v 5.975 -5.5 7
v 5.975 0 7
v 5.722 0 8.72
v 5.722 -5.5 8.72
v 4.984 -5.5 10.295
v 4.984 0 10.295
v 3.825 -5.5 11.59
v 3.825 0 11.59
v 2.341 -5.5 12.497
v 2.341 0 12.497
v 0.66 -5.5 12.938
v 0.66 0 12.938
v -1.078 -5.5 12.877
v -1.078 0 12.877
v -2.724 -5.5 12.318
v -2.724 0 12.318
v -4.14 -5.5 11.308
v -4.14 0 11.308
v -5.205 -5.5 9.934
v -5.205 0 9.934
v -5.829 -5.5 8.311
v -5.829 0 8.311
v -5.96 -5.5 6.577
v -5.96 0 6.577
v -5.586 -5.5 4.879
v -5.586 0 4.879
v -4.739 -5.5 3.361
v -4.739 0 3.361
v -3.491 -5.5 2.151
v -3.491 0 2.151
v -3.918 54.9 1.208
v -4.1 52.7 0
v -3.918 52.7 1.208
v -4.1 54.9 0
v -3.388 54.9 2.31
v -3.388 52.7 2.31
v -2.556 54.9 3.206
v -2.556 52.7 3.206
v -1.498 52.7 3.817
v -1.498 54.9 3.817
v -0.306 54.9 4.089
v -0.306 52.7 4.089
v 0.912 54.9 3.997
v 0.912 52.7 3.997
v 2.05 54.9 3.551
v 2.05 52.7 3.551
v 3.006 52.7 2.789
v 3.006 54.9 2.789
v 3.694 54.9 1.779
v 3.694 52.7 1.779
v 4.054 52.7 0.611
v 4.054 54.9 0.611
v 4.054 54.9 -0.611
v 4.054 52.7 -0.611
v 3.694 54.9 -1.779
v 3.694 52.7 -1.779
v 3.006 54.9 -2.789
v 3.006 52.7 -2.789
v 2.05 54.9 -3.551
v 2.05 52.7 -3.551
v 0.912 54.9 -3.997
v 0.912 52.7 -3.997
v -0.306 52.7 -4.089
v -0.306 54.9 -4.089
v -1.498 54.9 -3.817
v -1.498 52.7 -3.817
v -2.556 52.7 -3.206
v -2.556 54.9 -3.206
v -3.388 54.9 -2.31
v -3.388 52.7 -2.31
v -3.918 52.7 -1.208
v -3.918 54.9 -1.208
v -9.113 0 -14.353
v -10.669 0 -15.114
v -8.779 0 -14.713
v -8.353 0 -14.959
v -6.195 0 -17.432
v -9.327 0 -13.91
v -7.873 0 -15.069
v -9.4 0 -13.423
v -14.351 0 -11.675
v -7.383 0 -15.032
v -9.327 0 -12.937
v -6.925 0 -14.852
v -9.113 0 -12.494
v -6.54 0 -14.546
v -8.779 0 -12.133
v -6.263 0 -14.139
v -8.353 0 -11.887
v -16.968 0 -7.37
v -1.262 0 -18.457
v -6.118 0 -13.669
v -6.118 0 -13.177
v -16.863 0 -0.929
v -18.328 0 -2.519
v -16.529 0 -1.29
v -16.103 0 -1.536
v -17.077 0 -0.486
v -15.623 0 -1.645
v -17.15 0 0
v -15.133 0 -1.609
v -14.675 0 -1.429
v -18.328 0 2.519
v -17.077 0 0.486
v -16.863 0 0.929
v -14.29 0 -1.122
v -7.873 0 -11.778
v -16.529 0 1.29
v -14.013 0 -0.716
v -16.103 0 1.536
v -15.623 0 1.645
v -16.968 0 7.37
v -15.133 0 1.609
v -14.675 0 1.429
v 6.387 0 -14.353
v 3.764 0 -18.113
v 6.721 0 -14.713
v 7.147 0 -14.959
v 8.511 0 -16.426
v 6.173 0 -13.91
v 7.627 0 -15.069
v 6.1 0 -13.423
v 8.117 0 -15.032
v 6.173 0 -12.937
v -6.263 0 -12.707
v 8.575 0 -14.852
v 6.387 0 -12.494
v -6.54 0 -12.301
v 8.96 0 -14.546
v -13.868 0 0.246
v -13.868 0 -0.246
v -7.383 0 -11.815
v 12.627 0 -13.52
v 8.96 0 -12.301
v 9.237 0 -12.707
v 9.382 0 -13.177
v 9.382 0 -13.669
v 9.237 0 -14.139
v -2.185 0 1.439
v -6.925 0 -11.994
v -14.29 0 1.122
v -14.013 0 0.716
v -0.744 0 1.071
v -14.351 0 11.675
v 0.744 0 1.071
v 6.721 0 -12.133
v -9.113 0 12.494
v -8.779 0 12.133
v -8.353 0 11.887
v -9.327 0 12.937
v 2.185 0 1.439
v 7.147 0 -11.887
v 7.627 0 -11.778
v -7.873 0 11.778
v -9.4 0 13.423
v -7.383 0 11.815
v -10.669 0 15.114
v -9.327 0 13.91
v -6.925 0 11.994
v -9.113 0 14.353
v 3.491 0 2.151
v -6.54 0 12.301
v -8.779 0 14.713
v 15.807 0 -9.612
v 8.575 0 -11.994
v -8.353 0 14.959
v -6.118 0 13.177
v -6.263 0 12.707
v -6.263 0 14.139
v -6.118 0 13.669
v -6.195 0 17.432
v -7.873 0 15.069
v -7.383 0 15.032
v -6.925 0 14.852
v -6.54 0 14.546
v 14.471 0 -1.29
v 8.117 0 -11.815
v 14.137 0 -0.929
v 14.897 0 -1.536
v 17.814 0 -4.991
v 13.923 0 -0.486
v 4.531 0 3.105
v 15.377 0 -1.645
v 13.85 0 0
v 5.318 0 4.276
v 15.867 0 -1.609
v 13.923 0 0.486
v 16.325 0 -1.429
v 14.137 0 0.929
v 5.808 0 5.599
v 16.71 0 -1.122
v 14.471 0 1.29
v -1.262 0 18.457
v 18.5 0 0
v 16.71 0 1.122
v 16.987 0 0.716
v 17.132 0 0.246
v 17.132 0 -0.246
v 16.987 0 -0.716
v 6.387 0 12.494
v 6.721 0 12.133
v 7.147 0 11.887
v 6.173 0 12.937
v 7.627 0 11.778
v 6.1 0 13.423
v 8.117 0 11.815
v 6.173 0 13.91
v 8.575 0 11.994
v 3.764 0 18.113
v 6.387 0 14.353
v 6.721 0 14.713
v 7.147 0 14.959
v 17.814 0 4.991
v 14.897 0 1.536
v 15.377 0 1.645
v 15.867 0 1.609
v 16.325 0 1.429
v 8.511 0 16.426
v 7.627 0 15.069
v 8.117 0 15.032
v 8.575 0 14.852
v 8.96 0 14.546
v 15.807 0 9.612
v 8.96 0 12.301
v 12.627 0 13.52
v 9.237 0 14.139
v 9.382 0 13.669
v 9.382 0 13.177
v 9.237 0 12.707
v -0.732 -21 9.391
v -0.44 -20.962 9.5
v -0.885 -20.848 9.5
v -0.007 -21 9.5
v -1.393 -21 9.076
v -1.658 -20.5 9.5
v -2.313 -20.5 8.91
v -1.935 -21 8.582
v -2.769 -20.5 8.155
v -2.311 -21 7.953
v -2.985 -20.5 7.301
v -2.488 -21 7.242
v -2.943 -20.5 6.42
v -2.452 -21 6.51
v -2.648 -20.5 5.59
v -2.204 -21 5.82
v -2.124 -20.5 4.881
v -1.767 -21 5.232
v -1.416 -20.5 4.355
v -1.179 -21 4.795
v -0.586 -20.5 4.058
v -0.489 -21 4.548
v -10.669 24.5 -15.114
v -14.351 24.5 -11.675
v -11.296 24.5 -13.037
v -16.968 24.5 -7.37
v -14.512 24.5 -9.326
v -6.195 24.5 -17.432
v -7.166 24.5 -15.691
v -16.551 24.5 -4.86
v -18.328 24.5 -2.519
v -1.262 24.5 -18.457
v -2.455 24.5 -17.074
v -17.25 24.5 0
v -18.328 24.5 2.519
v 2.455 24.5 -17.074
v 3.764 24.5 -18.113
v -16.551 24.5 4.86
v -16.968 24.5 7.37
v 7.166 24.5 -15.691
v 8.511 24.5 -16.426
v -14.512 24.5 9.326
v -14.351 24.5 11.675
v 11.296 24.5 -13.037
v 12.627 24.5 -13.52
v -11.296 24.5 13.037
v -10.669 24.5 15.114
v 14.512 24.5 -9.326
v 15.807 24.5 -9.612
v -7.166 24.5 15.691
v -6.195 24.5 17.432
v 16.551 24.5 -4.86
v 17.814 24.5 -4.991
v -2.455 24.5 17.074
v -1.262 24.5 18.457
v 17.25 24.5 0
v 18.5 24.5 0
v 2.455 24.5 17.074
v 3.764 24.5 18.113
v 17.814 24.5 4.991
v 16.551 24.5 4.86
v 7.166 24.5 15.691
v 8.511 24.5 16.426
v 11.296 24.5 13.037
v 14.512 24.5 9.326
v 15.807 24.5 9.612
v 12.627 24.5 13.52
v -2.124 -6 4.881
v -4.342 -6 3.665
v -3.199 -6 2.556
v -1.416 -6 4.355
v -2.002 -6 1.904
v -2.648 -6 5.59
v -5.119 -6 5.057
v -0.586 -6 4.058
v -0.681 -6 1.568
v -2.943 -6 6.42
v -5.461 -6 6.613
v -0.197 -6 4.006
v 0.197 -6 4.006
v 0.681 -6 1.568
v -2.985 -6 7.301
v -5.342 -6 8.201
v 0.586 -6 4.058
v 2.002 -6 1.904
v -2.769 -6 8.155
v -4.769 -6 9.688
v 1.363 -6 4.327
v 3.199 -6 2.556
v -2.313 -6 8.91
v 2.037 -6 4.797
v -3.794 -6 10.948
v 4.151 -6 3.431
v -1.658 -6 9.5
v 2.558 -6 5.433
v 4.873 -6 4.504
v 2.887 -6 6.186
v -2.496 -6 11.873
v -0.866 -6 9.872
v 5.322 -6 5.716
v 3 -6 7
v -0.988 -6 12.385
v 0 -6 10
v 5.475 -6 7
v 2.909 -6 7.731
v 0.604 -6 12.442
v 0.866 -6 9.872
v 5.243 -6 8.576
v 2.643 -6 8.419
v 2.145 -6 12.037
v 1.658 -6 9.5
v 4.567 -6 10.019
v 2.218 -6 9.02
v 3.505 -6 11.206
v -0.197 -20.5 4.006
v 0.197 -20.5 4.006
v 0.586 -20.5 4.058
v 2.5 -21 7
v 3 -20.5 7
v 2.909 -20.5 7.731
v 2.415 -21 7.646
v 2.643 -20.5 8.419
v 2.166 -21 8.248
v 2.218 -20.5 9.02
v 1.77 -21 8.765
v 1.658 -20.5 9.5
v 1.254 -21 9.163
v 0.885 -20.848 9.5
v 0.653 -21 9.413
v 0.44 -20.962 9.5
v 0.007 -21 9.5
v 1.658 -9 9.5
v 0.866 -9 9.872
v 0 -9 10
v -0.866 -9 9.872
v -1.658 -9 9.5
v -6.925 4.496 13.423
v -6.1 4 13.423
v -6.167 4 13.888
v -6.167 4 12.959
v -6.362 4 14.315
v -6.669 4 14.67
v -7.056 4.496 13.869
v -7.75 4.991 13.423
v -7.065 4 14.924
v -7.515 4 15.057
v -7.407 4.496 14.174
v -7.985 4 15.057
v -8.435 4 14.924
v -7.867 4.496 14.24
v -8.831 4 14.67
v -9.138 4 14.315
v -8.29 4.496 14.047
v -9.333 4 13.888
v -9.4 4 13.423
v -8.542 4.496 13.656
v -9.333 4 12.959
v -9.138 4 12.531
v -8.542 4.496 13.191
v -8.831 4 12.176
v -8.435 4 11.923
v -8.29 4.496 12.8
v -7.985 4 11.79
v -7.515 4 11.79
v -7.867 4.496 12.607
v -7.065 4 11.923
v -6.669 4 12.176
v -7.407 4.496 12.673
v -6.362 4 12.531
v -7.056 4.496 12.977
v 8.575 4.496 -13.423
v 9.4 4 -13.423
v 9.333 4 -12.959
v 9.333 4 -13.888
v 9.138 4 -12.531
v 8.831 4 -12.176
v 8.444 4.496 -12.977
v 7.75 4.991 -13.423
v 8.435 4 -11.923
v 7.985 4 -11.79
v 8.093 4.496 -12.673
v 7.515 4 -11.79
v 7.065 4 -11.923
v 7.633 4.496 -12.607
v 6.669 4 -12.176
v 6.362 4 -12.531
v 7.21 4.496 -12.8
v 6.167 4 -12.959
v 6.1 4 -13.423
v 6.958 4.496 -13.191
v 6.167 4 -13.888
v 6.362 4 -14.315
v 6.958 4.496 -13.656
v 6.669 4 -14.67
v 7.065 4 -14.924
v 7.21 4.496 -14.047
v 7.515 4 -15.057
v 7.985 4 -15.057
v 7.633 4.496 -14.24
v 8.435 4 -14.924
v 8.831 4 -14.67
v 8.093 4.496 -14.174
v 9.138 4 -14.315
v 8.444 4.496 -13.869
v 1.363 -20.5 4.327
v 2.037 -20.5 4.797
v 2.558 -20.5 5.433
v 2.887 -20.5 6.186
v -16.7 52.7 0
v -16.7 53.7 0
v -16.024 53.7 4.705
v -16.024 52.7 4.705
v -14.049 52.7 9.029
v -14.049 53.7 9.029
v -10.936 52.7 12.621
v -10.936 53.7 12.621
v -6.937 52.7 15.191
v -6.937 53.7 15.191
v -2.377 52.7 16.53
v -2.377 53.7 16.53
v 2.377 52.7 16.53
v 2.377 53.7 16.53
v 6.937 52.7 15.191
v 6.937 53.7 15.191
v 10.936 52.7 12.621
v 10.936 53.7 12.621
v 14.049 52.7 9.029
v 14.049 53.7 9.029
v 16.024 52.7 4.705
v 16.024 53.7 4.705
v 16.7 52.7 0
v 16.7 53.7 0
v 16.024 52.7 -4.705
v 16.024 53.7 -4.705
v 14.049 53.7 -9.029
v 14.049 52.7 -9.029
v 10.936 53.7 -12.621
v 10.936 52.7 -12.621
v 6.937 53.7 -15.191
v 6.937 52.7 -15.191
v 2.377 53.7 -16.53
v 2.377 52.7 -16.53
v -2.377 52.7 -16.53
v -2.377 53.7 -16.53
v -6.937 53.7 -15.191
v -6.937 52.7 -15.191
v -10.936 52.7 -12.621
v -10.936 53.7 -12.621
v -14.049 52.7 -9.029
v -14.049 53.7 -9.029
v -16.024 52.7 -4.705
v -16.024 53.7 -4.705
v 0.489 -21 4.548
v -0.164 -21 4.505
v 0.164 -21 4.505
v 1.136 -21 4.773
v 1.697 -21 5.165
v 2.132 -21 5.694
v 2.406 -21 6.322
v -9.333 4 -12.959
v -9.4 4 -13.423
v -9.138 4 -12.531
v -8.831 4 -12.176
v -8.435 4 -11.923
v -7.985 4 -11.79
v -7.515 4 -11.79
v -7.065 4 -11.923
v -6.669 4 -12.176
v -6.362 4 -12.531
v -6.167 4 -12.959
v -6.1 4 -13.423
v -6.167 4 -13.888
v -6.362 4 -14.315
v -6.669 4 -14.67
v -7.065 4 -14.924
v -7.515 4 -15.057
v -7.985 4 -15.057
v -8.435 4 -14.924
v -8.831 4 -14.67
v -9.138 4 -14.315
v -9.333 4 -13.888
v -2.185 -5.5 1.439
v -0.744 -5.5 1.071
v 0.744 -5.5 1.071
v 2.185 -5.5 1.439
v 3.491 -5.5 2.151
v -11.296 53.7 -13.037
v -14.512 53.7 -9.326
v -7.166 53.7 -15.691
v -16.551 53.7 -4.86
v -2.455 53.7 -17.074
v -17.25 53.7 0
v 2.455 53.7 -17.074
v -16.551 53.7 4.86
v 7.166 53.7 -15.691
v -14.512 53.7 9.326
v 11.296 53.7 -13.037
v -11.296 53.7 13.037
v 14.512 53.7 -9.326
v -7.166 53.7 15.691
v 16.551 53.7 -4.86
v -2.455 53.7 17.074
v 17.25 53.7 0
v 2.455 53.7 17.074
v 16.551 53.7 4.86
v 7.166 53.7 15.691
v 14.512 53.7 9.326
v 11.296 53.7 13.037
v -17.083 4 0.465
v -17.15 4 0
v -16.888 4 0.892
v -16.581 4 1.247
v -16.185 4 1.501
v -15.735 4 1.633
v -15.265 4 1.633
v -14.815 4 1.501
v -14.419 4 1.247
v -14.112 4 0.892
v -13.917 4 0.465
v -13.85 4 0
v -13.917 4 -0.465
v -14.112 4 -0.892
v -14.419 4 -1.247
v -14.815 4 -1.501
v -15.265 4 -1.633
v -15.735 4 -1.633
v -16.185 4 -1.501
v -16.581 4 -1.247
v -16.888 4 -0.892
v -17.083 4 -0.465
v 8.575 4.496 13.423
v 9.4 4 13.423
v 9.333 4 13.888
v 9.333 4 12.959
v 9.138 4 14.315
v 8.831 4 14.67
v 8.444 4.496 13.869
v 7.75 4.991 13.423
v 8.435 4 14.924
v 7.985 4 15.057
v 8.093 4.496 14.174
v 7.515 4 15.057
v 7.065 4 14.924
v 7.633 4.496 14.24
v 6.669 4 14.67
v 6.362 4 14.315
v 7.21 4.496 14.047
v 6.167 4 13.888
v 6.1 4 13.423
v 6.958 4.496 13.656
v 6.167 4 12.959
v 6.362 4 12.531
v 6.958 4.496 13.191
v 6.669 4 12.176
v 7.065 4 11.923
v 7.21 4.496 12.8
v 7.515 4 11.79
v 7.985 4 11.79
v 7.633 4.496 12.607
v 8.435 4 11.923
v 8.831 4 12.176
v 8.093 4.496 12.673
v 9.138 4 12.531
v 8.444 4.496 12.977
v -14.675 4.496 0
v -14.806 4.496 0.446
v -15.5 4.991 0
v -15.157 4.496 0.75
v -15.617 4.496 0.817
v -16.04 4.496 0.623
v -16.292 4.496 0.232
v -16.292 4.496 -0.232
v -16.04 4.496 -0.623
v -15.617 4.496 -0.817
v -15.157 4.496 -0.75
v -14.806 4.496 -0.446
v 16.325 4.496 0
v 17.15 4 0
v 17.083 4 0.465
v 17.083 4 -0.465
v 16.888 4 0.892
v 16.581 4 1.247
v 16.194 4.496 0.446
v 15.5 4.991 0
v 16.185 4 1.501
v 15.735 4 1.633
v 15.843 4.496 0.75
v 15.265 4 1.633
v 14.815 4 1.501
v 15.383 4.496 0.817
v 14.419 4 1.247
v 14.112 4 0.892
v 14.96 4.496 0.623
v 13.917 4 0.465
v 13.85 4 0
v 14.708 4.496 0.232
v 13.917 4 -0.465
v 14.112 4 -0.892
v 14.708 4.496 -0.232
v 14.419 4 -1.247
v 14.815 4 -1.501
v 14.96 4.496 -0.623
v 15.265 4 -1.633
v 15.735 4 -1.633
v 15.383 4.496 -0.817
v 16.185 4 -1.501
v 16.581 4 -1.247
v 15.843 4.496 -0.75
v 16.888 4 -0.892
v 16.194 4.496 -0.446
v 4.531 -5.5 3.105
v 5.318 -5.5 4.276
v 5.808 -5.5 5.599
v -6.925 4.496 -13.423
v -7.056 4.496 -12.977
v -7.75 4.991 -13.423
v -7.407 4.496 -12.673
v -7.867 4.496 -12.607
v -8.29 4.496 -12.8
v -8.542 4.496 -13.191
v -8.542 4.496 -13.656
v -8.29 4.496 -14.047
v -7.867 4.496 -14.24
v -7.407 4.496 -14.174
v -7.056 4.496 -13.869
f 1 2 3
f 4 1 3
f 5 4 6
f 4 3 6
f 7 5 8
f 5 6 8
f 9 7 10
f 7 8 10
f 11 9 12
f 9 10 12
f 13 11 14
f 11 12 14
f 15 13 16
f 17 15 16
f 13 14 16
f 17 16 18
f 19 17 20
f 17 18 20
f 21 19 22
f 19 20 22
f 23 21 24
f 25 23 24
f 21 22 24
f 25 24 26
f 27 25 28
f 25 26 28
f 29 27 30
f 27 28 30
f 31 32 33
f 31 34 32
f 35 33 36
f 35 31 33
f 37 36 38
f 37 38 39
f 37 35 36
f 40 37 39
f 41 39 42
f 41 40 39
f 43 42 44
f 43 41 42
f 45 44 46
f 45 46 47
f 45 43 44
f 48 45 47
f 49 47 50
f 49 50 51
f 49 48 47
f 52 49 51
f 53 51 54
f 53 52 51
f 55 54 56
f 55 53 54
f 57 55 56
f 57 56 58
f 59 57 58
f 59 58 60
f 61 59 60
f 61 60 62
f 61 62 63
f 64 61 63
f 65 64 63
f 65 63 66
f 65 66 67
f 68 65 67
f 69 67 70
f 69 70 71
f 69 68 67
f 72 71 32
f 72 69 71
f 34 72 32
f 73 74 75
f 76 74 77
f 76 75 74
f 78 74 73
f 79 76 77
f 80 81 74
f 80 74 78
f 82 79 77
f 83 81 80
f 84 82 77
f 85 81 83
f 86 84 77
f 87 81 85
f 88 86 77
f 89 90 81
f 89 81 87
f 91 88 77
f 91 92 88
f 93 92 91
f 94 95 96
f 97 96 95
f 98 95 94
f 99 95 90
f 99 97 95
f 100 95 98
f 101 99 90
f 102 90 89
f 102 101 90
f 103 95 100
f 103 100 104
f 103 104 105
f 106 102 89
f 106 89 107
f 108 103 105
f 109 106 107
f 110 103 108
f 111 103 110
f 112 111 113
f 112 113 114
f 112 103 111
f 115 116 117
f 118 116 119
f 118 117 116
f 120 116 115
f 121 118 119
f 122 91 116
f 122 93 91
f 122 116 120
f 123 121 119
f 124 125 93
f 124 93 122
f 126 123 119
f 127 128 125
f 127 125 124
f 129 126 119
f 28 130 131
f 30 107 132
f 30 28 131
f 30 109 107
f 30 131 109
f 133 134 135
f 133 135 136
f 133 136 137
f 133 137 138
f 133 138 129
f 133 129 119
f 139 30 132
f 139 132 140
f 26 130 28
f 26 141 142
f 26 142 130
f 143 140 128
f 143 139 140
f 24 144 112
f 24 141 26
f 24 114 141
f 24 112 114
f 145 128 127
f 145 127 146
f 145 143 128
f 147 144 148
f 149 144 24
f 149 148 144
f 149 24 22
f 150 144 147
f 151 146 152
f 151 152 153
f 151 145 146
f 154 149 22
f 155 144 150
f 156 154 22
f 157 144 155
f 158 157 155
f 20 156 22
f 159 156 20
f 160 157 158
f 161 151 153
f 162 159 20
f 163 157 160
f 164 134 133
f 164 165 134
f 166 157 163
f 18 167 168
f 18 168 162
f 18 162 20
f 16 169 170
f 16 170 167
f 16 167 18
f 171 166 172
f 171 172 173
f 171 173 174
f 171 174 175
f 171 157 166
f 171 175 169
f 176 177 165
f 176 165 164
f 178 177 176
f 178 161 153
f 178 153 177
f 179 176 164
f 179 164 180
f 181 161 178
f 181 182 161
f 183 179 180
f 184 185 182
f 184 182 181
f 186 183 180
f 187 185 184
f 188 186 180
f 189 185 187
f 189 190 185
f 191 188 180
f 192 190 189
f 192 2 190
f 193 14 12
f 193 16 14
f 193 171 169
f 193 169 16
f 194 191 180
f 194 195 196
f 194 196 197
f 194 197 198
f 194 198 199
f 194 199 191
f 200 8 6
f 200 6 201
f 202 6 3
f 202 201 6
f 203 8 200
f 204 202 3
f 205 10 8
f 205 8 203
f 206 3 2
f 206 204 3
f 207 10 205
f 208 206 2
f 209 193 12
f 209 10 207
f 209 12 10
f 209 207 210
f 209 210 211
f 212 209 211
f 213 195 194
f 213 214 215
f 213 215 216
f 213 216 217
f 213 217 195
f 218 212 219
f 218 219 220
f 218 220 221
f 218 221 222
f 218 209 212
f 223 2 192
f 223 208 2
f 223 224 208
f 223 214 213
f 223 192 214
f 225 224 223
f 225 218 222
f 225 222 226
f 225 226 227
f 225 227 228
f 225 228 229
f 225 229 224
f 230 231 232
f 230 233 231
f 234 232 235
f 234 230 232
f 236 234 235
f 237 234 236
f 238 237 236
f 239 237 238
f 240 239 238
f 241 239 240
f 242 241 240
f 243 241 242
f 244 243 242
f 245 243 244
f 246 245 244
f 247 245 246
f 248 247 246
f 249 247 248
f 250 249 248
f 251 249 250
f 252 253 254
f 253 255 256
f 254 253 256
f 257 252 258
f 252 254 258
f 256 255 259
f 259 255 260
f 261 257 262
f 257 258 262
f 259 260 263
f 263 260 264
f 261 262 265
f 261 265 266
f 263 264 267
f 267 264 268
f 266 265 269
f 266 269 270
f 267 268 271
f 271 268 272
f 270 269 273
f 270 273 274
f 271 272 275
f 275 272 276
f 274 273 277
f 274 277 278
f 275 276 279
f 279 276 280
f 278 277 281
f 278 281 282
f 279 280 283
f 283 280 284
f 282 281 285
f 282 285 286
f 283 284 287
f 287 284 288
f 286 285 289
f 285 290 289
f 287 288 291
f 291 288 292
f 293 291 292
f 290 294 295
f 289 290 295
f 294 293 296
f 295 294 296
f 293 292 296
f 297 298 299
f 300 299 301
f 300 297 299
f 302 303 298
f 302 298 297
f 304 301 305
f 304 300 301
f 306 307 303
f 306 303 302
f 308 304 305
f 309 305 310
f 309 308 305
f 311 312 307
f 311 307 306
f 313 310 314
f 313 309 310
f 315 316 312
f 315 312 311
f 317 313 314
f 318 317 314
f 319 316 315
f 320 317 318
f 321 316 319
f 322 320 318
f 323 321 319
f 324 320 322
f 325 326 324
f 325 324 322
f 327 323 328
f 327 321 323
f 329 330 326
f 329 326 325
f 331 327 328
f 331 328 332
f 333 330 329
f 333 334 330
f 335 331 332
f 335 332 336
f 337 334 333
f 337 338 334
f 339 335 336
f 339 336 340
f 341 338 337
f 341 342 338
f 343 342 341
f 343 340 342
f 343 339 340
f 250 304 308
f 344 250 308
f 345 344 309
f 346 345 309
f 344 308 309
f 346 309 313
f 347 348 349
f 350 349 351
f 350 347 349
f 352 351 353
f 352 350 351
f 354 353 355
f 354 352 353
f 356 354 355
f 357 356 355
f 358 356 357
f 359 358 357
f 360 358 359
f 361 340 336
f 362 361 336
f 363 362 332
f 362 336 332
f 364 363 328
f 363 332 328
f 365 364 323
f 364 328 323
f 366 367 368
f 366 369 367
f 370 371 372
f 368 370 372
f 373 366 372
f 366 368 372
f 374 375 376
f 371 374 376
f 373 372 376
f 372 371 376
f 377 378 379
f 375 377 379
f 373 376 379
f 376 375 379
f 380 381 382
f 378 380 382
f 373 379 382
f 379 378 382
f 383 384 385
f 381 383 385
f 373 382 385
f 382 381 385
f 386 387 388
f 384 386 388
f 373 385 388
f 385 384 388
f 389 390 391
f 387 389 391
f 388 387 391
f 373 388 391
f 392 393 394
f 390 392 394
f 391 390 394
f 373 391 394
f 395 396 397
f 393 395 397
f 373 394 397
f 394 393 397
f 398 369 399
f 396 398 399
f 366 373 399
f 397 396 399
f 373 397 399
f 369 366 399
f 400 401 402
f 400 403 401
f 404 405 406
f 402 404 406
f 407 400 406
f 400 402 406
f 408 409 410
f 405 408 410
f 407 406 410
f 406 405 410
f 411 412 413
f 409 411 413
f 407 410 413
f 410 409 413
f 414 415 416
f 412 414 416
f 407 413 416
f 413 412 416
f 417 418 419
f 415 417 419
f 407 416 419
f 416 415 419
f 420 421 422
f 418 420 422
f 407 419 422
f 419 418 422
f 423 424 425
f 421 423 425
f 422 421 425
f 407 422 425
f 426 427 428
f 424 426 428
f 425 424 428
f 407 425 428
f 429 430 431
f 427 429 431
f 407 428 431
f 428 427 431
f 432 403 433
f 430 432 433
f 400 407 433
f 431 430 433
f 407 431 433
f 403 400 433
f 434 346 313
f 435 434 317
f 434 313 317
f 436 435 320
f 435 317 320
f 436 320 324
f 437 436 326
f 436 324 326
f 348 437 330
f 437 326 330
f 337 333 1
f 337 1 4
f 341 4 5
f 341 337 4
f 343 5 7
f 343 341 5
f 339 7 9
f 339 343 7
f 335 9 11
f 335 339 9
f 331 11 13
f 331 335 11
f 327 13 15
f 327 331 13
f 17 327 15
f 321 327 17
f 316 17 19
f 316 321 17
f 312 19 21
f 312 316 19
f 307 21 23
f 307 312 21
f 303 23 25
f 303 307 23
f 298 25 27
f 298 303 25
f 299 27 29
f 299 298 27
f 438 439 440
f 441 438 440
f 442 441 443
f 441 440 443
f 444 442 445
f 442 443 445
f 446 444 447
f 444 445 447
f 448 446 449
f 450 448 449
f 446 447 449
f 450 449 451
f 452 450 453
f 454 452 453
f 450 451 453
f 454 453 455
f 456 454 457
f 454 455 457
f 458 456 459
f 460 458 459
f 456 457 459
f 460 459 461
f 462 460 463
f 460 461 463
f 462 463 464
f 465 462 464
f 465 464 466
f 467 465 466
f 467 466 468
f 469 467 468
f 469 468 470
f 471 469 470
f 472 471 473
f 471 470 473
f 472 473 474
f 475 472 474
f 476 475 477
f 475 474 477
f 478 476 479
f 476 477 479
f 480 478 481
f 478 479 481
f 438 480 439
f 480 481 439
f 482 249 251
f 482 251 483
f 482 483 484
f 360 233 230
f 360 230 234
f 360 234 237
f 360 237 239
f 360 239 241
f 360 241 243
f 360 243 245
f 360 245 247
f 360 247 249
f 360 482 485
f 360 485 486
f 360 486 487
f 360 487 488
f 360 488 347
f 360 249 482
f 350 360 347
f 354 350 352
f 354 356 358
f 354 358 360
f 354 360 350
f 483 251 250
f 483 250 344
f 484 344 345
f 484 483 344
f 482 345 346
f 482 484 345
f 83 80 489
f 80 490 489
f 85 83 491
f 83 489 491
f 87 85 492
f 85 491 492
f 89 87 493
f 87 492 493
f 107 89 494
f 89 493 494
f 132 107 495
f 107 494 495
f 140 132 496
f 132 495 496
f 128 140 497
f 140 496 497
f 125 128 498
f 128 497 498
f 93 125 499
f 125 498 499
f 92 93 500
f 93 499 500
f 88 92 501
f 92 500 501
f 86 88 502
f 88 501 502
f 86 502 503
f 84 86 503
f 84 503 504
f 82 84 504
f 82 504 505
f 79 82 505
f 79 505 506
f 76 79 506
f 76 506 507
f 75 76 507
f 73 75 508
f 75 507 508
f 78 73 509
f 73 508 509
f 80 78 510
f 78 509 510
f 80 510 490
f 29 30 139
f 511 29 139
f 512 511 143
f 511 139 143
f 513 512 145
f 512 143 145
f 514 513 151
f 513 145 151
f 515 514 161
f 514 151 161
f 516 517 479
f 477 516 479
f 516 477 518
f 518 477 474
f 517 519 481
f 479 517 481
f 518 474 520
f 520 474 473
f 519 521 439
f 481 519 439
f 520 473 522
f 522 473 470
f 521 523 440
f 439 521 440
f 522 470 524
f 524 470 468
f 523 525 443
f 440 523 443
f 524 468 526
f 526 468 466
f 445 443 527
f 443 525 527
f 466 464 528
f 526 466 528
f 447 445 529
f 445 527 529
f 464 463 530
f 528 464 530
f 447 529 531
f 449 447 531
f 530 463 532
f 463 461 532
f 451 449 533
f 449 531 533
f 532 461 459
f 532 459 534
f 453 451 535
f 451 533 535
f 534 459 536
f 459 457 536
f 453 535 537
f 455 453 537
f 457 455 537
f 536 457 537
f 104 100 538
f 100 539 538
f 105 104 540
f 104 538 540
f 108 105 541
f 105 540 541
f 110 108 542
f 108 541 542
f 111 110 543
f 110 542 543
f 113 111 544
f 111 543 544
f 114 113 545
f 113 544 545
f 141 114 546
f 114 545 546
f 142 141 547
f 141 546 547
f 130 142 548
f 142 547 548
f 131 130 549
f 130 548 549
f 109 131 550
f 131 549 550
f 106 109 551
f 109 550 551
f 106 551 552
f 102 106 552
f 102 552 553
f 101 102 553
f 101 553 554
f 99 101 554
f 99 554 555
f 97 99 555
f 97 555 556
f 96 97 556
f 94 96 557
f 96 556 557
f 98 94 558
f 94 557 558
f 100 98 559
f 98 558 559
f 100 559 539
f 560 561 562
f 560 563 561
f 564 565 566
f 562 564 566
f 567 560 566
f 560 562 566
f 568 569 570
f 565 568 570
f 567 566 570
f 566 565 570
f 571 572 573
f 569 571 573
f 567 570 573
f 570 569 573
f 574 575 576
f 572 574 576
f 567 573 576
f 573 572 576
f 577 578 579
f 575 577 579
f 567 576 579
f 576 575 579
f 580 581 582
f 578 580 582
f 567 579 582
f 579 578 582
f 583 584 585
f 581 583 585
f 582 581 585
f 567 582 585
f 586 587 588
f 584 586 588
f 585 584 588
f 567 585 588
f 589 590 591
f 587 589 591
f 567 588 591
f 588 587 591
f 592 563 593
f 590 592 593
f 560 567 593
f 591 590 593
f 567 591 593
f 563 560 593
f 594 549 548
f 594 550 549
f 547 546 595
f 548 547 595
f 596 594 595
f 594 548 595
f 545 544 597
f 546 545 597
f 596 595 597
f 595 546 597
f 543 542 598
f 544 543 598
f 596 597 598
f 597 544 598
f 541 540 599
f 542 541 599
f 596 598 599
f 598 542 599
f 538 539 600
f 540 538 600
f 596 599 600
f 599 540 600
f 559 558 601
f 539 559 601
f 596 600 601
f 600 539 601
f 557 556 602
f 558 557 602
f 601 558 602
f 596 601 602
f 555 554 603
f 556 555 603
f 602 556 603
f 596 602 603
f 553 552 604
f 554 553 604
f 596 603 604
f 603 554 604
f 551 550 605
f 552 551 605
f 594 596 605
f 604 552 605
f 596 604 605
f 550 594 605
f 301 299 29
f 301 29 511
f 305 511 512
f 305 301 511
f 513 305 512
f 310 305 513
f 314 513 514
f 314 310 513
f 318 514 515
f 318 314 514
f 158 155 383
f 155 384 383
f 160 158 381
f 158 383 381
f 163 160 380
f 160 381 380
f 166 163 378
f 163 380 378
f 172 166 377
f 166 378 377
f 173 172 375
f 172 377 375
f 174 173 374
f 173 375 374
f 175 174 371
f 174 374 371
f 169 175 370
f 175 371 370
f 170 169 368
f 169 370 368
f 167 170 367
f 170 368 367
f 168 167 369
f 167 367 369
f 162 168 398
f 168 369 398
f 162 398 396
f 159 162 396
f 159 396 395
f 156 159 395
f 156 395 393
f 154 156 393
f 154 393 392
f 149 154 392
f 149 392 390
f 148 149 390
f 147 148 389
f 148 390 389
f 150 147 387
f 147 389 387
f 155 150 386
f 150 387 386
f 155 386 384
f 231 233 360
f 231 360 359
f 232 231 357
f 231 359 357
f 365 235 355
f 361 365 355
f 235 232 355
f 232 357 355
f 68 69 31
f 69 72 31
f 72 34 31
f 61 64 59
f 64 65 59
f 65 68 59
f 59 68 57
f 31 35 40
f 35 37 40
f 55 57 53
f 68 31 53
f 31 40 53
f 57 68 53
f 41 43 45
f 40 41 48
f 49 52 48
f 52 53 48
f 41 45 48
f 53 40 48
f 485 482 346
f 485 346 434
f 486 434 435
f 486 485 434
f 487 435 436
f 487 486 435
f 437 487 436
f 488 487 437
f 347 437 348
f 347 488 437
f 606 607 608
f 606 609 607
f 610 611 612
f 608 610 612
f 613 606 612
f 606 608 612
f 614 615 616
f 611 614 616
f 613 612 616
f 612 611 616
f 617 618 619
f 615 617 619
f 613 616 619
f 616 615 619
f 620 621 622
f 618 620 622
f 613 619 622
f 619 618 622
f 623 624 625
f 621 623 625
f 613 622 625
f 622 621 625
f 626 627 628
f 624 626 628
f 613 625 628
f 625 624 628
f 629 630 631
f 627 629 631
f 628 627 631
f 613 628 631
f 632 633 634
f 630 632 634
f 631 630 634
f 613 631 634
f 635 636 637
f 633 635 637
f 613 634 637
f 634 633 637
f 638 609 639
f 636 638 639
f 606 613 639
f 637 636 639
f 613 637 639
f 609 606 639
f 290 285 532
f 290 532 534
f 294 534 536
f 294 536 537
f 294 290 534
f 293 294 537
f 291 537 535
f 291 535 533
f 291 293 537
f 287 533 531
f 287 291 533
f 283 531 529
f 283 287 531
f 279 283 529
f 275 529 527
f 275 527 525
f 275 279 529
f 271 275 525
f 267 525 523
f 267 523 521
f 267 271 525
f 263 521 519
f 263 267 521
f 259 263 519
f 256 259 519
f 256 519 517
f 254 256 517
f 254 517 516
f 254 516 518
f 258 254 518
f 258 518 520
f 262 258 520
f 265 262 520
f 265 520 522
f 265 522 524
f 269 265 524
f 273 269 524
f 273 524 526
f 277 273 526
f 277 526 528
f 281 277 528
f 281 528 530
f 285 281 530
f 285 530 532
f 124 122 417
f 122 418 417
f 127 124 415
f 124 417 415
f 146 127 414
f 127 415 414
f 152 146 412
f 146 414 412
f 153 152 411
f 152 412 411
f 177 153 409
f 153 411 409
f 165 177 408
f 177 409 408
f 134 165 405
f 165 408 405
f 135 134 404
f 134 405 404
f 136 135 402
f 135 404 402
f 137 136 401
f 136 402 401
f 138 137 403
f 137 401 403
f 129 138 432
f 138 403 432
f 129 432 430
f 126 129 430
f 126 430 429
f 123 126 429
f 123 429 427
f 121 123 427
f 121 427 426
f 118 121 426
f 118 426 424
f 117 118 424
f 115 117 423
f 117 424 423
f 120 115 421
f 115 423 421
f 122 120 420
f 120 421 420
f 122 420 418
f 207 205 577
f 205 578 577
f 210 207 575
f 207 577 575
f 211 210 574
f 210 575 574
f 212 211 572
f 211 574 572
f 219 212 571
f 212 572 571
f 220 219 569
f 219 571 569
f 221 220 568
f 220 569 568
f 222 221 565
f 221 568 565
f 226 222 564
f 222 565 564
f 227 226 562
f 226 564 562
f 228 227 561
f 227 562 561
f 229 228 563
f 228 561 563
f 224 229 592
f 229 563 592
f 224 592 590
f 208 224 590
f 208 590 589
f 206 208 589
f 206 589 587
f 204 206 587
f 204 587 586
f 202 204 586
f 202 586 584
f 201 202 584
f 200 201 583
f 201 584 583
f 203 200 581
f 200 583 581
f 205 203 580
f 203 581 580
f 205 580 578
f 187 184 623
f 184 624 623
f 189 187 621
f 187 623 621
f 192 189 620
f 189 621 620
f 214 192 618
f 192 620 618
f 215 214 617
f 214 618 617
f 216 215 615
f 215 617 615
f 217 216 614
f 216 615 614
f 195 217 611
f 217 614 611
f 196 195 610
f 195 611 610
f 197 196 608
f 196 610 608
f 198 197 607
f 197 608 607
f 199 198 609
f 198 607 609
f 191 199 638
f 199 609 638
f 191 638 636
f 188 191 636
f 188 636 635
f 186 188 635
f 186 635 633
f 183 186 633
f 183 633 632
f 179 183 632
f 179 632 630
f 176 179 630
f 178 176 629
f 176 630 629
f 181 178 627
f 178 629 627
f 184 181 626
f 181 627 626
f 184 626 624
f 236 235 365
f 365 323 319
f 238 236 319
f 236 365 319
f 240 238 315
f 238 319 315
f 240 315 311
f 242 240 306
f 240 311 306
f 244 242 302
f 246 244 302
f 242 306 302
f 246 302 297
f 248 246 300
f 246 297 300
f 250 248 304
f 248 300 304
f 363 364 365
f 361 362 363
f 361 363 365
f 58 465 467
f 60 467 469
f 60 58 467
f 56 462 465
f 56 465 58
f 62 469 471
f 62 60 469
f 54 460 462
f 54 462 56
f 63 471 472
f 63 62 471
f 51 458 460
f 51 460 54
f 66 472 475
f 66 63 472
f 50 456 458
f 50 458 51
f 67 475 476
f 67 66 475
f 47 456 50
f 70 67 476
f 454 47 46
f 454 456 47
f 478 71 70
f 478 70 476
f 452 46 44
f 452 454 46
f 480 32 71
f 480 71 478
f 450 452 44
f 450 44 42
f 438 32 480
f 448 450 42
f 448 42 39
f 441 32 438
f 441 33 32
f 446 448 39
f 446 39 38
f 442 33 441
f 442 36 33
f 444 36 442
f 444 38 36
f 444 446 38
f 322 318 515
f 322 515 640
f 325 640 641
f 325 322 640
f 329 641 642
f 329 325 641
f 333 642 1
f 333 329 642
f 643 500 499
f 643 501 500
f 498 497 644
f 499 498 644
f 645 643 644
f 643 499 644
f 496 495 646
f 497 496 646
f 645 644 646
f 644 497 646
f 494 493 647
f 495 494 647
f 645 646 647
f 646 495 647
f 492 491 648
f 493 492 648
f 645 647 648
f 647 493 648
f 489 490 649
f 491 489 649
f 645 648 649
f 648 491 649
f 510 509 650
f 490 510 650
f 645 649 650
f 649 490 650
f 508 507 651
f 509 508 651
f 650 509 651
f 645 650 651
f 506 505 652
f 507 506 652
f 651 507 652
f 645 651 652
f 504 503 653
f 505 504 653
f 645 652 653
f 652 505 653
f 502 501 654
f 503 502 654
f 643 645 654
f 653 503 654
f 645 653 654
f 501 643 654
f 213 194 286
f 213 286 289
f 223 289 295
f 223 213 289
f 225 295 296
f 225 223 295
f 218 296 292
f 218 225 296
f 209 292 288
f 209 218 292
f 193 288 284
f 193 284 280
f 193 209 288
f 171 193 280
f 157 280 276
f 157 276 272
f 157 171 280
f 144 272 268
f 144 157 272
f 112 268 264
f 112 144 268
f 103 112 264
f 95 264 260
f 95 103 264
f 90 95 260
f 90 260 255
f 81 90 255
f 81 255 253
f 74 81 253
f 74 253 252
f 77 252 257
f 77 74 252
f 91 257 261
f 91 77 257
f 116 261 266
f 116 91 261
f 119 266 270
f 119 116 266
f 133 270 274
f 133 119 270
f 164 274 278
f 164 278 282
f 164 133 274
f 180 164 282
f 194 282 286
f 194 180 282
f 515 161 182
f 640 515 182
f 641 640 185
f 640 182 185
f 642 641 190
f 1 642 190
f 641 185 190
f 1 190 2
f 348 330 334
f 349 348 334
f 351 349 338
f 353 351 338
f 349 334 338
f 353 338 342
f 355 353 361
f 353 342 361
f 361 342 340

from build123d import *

# Parameters (mm, degrees)
F0_R      = 18.5
F0_R_2    = 17.25
F0_R_3    = 16.7
F0_R_4    = 4.1
F1_DEPTH  = 24.5
F2_DEPTH  = 53.7
F3_R      = 16.7
F3_R_2    = 4.1
F4_DEPTH  = 1
F5_DEPTH  = 1.2
F7_D      = 3.3
F7_DEPTH  = 4
F7_TIP    = 0.9914200214
F8_DEPTH  = 21
F9_DEPTH  = 6
F11_DEPTH = 12
F13_SIZE  = 0.49999


# Not quite as in the source:
# - a fillet or chamfer is up to 0.001 mm smaller than in the source, because OpenCascade refuses the exact size
# - a feature of the source that left no trace in its solid (it failed there, or was rolled back) is left out
# - a feature names something its author has since deleted; it is built from what else it names


with BuildPart() as f1:
    # F0 (on Front) → F1 (new body)
    with BuildSketch(Plane.XZ):
        Circle(F0_R)
        Circle(F0_R_2, mode=Mode.SUBTRACT)
        Circle(F0_R_2)
        Circle(F0_R_3, mode=Mode.SUBTRACT)
        Circle(F0_R_3)
        Circle(F0_R_4, mode=Mode.SUBTRACT)
        Circle(F0_R_4)
    extrude(amount=-F1_DEPTH)

    # F0 (on Front) → F2 (join)
    with BuildSketch(Plane.XZ):
        Circle(F0_R_2)
        Circle(F0_R_3, mode=Mode.SUBTRACT)
        Circle(F0_R_3)
        Circle(F0_R_4, mode=Mode.SUBTRACT)
        Circle(F0_R_4)
    extrude(amount=-F2_DEPTH)

    # F3 (on face) → F4 (cut)
    with BuildSketch(Plane(origin=(0, 53.7, 0), x_dir=(-1, 0, 0), z_dir=(0, 1, 0))):
        Circle(F3_R)
        Circle(F3_R_2, mode=Mode.SUBTRACT)
    extrude(amount=-F4_DEPTH, mode=Mode.SUBTRACT)

    # F5 (add): a face of the model
    f5_faces = [f1.faces().sort_by_distance(p)[0] for p in [
        (0, 53.7, 0),
    ]]
    extrude(f5_faces, amount=F5_DEPTH)

    # F7
    with Locations(Plane.XZ):
        with Locations((7.75, 13.4233937587), (15.5, 0), (7.75, -13.4233937587), (-7.75, -13.4233937587), (-15.5, 0), (-7.75, 13.4233937587)):
            Hole(F7_D / 2, depth=F7_DEPTH)
            with Locations((0, 0, -(F7_DEPTH + F7_TIP / 2))):  # 118° drill point
                Cone(0, F7_D / 2, F7_TIP, mode=Mode.SUBTRACT)

    # F6 (on face) → F8 (join)
    with BuildSketch(Plane.XZ):
        with BuildLine():
            ThreePointArc((0.5863406929, 4.0578571429), (0, 4.1), (-0.5863406929, 4.0578571429))
            ThreePointArc((-0.5863406929, 4.0578571429), (0, 4), (0.5863406929, 4.0578571429))
        make_face()
        with BuildLine():
            ThreePointArc((-1.6583123952, 9.5), (-2.9434412837, 6.4202126173), (-0.5863406929, 4.0578571429))
            ThreePointArc((-0.5863406929, 4.0578571429), (0, 4.1), (0.5863406929, 4.0578571429))
            ThreePointArc((0.5863406929, 4.0578571429), (2.3193772956, 5.0972417493), (3, 7))
            ThreePointArc((3, 7), (2.6433820369, 8.4186371655), (1.6583123952, 9.5))
            Line((1.6583123952, 9.5), (-1.6583123952, 9.5))
        make_face()
        with BuildLine():
            ThreePointArc((1.6583123952, 9.5), (0, 10), (-1.6583123952, 9.5))
            Line((-1.6583123952, 9.5), (1.6583123952, 9.5))
        make_face()
    extrude(amount=F8_DEPTH)

    # F6 (on face) → F9 (join)
    with BuildSketch(Plane.XZ):
        with BuildLine():
            ThreePointArc((-0.5863406929, 4.0578571429), (-2.2505108877, 3.4271271853), (-3.4906475169, 2.1506696429))
            ThreePointArc((-3.4906475169, 2.1506696429), (0, 1.025), (3.4906475169, 2.1506696429))
            ThreePointArc((3.4906475169, 2.1506696429), (2.2505108877, 3.4271271853), (0.5863406929, 4.0578571429))
            ThreePointArc((0.5863406929, 4.0578571429), (0, 4), (-0.5863406929, 4.0578571429))
        make_face()
        with BuildLine():
            ThreePointArc((3.4906475169, 2.1506696429), (5.3177647519, 4.2756646603), (5.975, 7))
            ThreePointArc((5.975, 7), (-2.7243353397, 12.3177647519), (-3.4906475169, 2.1506696429))
            ThreePointArc((-3.4906475169, 2.1506696429), (-2.2505108877, 3.4271271853), (-0.5863406929, 4.0578571429))
            ThreePointArc((-0.5863406929, 4.0578571429), (-2.9434412837, 6.4202126173), (-1.6583123952, 9.5))
            ThreePointArc((-1.6583123952, 9.5), (0, 10), (1.6583123952, 9.5))
            ThreePointArc((1.6583123952, 9.5), (2.6433820369, 8.4186371655), (3, 7))
            ThreePointArc((3, 7), (2.3193772956, 5.0972417493), (0.5863406929, 4.0578571429))
            ThreePointArc((0.5863406929, 4.0578571429), (2.2505108877, 3.4271271853), (3.4906475169, 2.1506696429))
        make_face()
    extrude(amount=F9_DEPTH)

    # F10 (on face) → F11 (cut)
    with BuildSketch(Plane.XZ.offset(21)):
        with BuildLine():
            ThreePointArc((1.6583123952, 9.5), (0, 10), (-1.6583123952, 9.5))
            Line((-1.6583123952, 9.5), (1.6583123952, 9.5))
        make_face()
    extrude(amount=-F11_DEPTH, mode=Mode.SUBTRACT)

    # F13 (size 0.5 in the source; OpenCascade refuses exactly that, so slightly less here)
    f13_edges = [f1.edges().sort_by_distance(p)[0] for p in [
        (-3.490648, -6, 11.84933),
        (0, -21, 4),
    ]]
    chamfer(f13_edges, length=F13_SIZE)


solid = f1.part
